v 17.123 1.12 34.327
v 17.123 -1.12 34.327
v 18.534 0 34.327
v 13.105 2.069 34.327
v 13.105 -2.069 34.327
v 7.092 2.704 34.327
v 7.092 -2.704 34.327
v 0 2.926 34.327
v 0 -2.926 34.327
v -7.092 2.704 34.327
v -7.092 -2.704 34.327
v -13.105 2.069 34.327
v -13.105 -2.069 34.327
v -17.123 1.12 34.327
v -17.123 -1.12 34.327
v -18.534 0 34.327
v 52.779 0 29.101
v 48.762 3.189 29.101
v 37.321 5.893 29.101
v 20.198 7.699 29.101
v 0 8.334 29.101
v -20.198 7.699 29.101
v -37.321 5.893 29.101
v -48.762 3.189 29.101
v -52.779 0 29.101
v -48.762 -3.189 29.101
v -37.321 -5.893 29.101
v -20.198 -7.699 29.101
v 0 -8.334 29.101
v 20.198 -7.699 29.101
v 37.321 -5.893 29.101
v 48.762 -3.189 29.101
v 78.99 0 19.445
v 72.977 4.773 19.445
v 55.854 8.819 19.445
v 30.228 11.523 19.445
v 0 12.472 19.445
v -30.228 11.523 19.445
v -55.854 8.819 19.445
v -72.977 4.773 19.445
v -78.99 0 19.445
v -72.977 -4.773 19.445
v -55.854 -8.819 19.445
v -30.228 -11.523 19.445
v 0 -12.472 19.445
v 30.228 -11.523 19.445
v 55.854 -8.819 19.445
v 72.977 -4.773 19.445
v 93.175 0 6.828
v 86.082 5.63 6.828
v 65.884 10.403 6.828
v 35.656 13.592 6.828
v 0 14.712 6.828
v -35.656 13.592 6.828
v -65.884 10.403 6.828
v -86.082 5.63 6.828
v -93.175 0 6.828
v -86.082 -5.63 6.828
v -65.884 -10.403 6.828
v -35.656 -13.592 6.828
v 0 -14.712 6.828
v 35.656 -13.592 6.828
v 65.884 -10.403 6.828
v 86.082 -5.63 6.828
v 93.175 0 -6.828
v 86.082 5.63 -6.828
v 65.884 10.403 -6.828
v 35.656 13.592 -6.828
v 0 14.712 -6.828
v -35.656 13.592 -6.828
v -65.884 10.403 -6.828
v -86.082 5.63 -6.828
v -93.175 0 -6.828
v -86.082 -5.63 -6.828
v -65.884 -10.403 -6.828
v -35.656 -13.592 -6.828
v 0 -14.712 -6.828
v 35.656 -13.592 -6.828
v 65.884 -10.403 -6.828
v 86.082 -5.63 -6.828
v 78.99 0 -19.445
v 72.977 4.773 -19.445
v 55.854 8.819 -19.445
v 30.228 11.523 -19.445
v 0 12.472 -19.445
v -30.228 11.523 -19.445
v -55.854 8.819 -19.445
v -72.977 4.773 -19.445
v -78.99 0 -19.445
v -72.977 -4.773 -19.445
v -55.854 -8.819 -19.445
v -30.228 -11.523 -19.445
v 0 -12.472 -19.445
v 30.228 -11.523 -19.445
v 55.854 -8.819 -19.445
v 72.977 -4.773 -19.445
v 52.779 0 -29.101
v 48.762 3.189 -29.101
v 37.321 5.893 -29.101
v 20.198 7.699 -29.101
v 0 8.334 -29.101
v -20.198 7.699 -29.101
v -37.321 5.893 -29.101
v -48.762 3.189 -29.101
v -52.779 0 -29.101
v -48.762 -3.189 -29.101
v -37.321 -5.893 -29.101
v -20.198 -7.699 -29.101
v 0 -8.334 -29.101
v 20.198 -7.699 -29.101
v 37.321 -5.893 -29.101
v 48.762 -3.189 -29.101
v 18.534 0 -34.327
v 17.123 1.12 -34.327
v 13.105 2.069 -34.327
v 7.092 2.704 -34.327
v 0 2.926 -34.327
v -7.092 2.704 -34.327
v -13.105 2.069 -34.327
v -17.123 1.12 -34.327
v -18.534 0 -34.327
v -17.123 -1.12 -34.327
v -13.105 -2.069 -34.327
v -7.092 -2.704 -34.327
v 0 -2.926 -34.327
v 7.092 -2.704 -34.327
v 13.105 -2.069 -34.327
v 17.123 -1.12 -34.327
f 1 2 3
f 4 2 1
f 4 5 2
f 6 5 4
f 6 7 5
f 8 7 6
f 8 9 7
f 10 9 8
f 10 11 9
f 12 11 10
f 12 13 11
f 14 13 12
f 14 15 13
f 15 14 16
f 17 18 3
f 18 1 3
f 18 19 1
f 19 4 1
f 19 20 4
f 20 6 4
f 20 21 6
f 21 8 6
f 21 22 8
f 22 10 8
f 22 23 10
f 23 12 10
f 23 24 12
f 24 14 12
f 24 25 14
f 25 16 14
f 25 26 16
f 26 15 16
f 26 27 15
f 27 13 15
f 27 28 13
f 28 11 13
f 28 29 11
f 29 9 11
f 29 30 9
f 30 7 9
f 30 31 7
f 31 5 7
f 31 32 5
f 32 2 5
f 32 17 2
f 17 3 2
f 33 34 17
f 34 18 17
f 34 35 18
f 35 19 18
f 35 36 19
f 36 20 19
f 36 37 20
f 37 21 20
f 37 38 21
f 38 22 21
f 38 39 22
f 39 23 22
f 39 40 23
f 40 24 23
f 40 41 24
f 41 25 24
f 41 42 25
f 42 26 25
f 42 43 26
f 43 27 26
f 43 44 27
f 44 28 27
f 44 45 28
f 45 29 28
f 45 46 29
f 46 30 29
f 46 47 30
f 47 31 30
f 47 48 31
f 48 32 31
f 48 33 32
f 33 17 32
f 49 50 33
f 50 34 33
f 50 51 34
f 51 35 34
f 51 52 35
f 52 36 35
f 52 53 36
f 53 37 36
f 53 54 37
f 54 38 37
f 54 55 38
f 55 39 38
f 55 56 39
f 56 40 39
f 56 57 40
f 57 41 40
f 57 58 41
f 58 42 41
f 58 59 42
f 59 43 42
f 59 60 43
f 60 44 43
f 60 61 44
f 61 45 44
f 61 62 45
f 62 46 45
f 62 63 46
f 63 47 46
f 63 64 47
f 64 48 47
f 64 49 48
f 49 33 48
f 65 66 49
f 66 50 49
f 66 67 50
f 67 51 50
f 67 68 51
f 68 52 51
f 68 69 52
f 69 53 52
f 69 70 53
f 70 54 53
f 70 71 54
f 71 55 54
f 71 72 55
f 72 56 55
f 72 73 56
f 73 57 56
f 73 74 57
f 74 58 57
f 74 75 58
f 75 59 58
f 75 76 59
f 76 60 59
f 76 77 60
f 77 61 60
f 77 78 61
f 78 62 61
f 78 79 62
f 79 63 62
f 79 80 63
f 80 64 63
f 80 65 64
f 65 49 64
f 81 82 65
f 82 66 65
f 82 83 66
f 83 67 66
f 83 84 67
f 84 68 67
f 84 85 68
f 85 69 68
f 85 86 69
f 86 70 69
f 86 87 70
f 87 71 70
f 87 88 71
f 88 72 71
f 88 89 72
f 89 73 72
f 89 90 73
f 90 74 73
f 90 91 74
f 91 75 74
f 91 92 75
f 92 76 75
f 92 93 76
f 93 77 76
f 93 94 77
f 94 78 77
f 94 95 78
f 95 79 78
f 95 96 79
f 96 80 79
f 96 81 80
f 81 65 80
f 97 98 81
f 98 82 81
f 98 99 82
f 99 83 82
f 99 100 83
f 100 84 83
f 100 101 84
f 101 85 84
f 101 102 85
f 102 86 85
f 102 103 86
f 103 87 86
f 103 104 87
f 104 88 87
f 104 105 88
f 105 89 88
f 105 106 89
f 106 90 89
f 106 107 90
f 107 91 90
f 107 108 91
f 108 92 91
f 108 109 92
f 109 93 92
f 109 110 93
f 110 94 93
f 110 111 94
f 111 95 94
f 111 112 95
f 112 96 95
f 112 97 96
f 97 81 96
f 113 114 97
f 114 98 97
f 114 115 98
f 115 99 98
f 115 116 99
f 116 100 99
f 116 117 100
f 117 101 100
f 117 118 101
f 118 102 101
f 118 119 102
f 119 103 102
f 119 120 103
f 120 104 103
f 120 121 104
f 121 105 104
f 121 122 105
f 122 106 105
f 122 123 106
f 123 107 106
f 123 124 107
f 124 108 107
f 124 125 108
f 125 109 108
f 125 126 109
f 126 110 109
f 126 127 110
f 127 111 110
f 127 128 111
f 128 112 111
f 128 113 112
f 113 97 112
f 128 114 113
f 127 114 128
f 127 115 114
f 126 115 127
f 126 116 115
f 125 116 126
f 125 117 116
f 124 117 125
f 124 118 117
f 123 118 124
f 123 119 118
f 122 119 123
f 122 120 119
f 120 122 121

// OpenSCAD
// Generated by SolidPython 1.0.1 on 2020-07-29 00:46:53


scale(v = [19, 3, 7]) {
	sphere(r = 5);
}
/***********************************************
*********      SolidPython code:      **********
************************************************
 
# import packages: SolidPython
from solid import *
from solid.utils import *
from itertools import chain, combinations, permutations


class Resize:

    def __init__(self, scad_file):
        self.scad_file = scad_file
        #self.scad_file = import_scad(scad_file)
        # cone/cylinder param:
        self.r1 = 0
        self.r2 = 0
        self.h = 0
        # rectangular prism param:
        self.w = 0
        self.l = 0
        # ellipse param:
        self.r = 0

    # import OpenScad code (file name corresponds to shape)


    # classify shape + parameters
    def assign(self, param1, param2, param3):
        if self.scad_file == 'cone.scad':
            self.r1 = param1
            self.r2 = param2
            self.h = param3
        elif self.scad_file == 'cylinder.scad':
            self.r1 = param1
            self.r2 = param2
            self.h = param3
        elif self.scad_file == 'rectangularPrism.scad':
            self.h = param1
            self.l = param2
            self.w = param3
        else:
            self.r = param1
            self.h = param2

    # resize parameters
    def iterate(self):
        x = range(3, 20, 2)
        i = 1
        if self.scad_file == 'cone.scad':
            tempList = list(permutations(x, 2))
            for temp in tempList:
                param1 = temp[0]
                param2 = temp[1]
                filepath = 'produced_scad_files/' + 'cone' + str(param1) + '_' + str(param2) + '_' + '.scad'
                scad_render_to_file(cylinder(h=param1, r1=param2, r2=0), filepath)

        elif self.scad_file == 'cylinder.scad':
            tempList = list(permutations(x, 3))
            for temp in tempList:
                param1 = temp[0]
                param2 = temp[1]
                filepath = 'produced_scad_files/' + 'cylinder' + str(param1) + '_' + str(param2) + '_' + '.scad'
                scad_render_to_file(cylinder(h=param1, r1=param2, r2=param2), filepath)

        elif self.scad_file == 'rectangularPrism.scad':
            tempList = list(permutations(x, 3))
            for temp in tempList:
                param1 = temp[0]
                param2 = temp[1]
                param3 = temp[2]
                filepath = 'produced_scad_files/' + 'rectangularPrism' + str(param1) + '_' + str(param2) + '_' + str(
                    param3) + '.scad'
                scad_render_to_file(cube(size=(param1, param2, param3)), filepath)

        elif self.scad_file == 'ellipse.scad':
            tempList = list(permutations(x, 4))
            for temp in tempList:
                param1 = temp[0]
                param2 = temp[1]
                param3 = temp[2]
                param4 = temp[3]
                filepath = 'produced_scad_files/' + 'ellipse' + str(param1) + '_' + str(param2) + '_' + str(param3) + '_' + str(param4) + '.scad'
                scad_render_to_file(scale([param1, param2, param3])(sphere(r=param4)), filepath)

    def render_to_scadfile(self):
        scad_render_to_file(scad, 'example.scad') 
 
************************************************/
